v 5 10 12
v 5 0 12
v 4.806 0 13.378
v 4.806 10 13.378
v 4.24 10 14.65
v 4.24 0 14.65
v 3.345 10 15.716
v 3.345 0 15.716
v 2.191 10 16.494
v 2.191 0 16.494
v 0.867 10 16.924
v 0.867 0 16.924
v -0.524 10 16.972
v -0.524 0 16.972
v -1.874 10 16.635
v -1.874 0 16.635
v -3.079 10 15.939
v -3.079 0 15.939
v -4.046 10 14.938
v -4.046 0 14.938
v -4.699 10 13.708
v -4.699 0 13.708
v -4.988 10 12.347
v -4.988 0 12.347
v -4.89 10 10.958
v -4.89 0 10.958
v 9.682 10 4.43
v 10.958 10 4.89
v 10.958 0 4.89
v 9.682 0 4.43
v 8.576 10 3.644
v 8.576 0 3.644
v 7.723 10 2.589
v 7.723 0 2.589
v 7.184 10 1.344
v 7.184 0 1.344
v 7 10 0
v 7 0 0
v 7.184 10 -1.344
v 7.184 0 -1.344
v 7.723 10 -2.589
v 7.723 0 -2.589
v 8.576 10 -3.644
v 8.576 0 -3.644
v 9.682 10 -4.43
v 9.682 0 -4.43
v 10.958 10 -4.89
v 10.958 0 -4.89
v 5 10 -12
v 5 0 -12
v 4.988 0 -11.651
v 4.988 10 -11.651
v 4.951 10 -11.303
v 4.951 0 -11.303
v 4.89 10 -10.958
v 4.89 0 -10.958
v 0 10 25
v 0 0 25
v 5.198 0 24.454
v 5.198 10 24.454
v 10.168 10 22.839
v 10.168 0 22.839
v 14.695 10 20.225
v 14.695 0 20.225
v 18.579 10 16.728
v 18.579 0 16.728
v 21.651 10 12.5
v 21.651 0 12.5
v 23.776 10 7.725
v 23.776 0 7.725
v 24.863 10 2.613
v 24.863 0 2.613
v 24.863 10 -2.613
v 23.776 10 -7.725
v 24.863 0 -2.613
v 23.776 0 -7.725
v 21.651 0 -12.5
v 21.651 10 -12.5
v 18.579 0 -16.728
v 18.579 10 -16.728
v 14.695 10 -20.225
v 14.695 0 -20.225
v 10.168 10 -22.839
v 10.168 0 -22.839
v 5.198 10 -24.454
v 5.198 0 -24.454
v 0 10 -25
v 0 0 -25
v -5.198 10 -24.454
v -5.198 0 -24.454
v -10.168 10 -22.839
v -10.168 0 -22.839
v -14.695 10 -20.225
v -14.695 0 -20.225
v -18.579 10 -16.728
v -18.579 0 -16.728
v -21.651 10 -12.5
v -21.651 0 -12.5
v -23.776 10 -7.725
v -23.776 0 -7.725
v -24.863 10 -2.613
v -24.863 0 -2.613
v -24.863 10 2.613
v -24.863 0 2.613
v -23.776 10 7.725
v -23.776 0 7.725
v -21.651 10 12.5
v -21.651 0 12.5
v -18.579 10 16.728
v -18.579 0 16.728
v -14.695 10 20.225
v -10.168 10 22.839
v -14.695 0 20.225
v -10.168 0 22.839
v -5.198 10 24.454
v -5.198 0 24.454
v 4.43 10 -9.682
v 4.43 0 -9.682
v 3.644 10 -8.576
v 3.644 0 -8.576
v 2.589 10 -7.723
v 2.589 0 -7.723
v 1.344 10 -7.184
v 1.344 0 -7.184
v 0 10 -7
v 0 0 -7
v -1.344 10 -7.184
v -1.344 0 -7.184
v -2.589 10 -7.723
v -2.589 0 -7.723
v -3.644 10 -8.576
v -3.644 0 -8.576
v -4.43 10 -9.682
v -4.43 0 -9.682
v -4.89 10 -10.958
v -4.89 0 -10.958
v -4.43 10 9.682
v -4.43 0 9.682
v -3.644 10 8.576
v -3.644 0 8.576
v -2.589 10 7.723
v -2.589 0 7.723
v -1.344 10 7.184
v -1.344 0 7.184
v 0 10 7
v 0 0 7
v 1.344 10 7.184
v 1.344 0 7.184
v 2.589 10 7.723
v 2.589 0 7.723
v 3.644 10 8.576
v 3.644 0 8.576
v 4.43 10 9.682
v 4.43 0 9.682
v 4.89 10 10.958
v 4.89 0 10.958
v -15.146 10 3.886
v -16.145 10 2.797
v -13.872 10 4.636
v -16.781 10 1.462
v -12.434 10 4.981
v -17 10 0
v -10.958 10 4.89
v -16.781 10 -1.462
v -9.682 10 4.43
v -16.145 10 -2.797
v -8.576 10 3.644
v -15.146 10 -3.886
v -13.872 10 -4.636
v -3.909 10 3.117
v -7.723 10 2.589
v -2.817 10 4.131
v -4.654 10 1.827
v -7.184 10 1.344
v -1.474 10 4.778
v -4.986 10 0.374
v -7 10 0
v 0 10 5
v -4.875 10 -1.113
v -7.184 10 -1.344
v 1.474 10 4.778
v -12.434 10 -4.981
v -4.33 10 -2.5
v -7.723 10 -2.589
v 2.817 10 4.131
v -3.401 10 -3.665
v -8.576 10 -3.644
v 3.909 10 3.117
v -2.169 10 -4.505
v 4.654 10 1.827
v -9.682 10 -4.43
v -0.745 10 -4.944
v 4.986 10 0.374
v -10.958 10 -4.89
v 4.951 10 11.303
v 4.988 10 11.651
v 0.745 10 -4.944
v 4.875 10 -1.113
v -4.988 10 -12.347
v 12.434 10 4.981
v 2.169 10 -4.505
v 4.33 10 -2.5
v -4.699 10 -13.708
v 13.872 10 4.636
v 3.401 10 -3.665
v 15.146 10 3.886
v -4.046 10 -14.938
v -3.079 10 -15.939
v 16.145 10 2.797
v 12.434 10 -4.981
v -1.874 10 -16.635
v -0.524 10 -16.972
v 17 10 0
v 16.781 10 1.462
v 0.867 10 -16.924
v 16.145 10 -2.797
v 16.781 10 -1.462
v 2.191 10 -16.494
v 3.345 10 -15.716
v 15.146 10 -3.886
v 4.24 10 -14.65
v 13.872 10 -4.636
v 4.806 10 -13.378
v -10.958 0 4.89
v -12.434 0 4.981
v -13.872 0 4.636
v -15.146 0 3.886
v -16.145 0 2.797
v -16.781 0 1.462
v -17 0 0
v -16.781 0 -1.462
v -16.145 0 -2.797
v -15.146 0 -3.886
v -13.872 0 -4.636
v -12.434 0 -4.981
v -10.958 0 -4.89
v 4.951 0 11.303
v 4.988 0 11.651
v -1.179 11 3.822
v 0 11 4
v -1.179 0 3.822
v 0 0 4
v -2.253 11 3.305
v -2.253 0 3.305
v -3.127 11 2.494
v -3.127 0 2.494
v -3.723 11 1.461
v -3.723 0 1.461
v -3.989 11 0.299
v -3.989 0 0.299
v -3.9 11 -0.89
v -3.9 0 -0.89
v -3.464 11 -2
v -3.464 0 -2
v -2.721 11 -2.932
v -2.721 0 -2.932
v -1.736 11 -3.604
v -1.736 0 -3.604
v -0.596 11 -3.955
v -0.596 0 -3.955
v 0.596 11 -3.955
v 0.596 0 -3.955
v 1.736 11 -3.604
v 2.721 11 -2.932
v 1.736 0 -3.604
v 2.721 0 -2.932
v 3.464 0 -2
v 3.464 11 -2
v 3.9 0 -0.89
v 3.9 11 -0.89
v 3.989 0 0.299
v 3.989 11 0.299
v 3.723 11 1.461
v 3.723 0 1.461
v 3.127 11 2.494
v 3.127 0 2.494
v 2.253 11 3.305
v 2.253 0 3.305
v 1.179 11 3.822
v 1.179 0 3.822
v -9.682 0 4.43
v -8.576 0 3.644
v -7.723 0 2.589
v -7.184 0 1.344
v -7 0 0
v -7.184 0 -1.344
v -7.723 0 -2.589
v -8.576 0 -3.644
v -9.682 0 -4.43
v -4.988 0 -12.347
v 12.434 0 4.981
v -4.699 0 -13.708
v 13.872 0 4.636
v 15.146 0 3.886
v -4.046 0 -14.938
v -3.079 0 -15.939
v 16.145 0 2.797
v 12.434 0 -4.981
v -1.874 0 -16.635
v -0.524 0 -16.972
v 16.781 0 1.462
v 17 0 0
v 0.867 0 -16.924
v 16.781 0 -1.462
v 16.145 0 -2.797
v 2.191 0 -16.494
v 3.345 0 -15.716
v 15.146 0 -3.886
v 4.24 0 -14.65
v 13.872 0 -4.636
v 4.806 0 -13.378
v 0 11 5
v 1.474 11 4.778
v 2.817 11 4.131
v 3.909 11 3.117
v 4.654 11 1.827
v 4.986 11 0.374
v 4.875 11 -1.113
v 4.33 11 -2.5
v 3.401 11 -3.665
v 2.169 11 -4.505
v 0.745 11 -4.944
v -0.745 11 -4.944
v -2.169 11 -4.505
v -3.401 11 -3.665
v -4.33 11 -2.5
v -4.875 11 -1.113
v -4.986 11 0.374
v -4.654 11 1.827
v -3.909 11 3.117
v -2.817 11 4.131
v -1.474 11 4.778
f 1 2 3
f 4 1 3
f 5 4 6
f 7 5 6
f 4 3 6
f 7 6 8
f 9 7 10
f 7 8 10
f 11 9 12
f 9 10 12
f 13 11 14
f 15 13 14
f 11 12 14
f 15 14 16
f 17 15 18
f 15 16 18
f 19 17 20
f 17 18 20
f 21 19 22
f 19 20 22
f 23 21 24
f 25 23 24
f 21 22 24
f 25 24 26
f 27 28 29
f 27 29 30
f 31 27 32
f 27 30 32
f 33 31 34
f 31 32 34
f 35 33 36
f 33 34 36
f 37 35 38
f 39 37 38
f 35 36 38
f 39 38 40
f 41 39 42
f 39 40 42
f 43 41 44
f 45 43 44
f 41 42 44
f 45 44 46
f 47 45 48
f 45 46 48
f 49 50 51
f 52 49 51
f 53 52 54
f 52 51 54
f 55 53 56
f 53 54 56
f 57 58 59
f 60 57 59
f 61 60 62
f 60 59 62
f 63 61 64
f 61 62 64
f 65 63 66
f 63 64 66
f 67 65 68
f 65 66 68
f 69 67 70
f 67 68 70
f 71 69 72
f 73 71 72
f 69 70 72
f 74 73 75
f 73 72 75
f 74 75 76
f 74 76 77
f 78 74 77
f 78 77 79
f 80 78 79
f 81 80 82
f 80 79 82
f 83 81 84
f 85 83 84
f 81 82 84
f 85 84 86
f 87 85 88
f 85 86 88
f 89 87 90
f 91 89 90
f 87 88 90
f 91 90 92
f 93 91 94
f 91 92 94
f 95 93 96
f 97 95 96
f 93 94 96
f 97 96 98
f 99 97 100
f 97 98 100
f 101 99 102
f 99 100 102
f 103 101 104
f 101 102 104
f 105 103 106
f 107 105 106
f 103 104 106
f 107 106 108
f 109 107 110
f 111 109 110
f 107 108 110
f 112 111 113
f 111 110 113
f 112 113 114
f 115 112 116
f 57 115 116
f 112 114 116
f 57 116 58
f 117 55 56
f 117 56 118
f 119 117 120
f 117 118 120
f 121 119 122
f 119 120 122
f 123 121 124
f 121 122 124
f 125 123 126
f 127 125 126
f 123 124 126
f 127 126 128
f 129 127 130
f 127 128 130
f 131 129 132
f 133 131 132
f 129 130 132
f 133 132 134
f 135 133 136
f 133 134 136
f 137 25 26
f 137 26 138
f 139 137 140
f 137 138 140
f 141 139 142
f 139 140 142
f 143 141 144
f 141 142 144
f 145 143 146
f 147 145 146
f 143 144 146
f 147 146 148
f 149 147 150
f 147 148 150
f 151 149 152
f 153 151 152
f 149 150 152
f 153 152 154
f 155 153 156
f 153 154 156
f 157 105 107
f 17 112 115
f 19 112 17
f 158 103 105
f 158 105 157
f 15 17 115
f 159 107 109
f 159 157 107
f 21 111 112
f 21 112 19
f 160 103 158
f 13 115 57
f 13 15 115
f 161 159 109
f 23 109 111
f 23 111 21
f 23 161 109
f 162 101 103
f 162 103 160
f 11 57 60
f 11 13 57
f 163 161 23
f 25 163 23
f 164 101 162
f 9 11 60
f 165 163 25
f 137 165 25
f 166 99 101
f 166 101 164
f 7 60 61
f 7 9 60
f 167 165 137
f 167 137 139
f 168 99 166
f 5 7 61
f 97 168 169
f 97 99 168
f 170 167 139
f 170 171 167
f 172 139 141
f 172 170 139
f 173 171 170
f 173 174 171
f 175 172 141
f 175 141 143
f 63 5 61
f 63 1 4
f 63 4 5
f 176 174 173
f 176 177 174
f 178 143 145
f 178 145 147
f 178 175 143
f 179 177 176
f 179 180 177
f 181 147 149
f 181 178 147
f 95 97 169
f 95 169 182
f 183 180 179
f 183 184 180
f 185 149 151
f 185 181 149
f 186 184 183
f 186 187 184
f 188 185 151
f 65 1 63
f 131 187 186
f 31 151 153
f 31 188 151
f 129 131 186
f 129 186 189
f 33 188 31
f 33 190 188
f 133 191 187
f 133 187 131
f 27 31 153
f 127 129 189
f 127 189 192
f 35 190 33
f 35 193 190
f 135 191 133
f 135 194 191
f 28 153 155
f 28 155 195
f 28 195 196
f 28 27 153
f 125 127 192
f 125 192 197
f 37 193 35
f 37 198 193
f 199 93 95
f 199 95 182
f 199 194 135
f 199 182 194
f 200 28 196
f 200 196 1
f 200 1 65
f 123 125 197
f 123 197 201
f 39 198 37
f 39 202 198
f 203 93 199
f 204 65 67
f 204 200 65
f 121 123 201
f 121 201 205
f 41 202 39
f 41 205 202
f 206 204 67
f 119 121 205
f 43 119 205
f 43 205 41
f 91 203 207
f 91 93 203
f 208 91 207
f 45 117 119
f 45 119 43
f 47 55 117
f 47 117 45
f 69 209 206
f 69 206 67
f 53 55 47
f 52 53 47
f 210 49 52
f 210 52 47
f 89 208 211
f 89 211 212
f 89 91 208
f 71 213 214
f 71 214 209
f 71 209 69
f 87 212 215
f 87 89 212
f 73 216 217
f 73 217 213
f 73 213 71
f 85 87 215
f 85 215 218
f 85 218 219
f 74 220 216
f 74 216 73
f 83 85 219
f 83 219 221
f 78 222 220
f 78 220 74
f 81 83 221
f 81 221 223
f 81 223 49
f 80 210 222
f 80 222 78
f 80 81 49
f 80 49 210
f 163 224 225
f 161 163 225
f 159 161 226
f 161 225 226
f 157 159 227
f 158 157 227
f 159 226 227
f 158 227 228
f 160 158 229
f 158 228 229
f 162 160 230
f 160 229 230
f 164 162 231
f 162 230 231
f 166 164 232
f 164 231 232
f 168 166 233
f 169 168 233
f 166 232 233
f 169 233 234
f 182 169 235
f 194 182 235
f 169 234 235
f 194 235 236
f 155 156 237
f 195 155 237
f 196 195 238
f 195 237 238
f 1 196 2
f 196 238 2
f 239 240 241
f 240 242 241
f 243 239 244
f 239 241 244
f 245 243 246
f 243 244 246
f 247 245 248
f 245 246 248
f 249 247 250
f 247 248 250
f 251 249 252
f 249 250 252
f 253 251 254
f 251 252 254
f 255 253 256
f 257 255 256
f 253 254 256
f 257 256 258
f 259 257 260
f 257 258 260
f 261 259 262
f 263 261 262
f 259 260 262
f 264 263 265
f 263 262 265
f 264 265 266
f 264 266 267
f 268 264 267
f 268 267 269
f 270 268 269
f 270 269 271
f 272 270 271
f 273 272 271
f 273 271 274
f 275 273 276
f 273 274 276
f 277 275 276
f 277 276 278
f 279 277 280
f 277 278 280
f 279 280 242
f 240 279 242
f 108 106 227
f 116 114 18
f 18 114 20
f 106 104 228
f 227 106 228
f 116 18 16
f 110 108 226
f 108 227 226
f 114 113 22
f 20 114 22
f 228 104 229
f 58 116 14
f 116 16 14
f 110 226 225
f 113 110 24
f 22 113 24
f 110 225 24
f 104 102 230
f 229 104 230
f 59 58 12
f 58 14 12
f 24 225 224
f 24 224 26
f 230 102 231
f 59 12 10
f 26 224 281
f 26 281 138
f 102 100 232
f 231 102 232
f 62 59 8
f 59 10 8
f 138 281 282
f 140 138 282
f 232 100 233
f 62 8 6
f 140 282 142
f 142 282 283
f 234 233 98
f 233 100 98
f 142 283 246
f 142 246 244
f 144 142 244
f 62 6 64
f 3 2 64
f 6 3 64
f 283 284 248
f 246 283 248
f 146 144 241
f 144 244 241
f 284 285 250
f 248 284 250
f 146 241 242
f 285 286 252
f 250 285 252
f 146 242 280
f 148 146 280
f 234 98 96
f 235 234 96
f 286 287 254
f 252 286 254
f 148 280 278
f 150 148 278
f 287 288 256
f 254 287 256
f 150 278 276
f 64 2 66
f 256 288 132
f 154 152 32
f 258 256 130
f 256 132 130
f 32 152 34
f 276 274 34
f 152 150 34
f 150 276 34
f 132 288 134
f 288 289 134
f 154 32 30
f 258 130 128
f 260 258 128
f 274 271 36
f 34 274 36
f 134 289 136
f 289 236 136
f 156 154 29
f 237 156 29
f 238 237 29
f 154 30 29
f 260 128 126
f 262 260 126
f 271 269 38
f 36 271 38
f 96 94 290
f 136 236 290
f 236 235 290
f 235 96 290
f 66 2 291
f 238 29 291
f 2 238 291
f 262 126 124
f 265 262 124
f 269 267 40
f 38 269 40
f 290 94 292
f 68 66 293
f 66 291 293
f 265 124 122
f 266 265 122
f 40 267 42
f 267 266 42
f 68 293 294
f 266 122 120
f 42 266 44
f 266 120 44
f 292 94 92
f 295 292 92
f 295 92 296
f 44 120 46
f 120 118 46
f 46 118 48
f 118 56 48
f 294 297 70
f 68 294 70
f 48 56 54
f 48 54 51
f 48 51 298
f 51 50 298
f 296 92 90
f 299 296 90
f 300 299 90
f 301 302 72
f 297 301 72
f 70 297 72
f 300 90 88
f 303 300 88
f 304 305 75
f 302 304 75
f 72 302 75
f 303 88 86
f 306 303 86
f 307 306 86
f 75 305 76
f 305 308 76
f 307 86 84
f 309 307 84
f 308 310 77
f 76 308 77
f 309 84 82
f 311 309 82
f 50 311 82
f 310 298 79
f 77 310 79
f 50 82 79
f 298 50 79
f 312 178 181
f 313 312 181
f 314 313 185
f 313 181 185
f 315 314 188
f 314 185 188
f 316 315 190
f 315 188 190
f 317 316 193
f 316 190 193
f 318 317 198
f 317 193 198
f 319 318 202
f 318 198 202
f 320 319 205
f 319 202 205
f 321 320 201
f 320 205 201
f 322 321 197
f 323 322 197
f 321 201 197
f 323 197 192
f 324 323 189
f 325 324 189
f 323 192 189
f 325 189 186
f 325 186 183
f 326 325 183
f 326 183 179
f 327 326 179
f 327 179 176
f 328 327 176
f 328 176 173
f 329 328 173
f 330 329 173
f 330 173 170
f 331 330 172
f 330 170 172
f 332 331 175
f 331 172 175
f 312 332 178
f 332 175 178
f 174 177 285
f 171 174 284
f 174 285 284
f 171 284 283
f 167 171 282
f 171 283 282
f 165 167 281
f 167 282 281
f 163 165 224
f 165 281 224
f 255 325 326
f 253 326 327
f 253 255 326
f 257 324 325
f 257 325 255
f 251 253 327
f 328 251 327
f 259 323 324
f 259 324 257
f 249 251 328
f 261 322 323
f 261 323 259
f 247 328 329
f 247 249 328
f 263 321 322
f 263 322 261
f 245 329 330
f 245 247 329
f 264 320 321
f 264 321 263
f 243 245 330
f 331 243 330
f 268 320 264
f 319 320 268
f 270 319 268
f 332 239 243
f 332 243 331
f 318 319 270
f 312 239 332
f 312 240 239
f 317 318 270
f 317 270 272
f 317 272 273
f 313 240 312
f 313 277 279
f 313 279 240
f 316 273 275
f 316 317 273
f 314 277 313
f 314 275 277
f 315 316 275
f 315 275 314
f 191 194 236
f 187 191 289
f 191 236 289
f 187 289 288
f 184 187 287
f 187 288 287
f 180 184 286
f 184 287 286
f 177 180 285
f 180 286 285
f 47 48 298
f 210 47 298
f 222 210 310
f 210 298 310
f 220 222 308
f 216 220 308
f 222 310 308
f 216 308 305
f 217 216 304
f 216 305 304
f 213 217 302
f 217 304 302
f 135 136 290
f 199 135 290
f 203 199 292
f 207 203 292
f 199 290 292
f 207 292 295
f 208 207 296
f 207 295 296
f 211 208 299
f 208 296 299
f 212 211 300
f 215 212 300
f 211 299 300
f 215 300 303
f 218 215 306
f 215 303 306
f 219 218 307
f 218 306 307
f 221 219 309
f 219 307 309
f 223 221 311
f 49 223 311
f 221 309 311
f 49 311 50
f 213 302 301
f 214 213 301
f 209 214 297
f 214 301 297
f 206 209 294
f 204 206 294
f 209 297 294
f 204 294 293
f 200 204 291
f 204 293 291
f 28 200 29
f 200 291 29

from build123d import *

# Parameters (mm, degrees)
SKETCH1_R           = 25
SKETCH1_R_2         = 4
BOSS_EXTRUDE1_DEPTH = 10
SKETCH2_R           = 5
BOSS_EXTRUDE2_DEPTH = 1
SKETCH3_R           = 4
CUT_EXTRUDE1_DEPTH  = 83


with BuildPart() as part:
    # Sketch1 → Boss-Extrude1 (new body)
    # profile 1 of 2: a face of its own
    with BuildSketch(Plane(origin=(0, 0, 0), x_dir=(1, 0, 0), z_dir=(0, 1, 0))):
        with Locations(Location((0, 0, 0), (0, 0, 270))):
            Circle(SKETCH1_R)
        with BuildLine():
            ThreePointArc((-4.890289414, -10.958333333), (-8.485281374, -8.485281374), (-10.958333333, -4.890289414))
            ThreePointArc((-10.958333333, -4.890289414), (-17, 0), (-10.958333333, 4.890289414))
            ThreePointArc((-10.958333333, 4.890289414), (-8.485281374, 8.485281374), (-4.890289414, 10.958333333))
            ThreePointArc((-4.890289414, 10.958333333), (-0.523714105, 16.97249671), (5, 12))
            ThreePointArc((5, 12), (4.97249671, 11.476285895), (4.890289414, 10.958333333))
            ThreePointArc((4.890289414, 10.958333333), (8.485281374, 8.485281374), (10.958333333, 4.890289414))
            ThreePointArc((10.958333333, 4.890289414), (15.145764348, 3.886407939), (17, 0))
            ThreePointArc((17, 0), (15.145764348, -3.886407939), (10.958333333, -4.890289414))
            ThreePointArc((10.958333333, -4.890289414), (8.485281374, -8.485281374), (4.890289414, -10.958333333))
            ThreePointArc((4.890289414, -10.958333333), (4.97249671, -11.476285895), (5, -12))
            ThreePointArc((5, -12), (-0.523714105, -16.97249671), (-4.890289414, -10.958333333))
        make_face(mode=Mode.SUBTRACT)
    # profile 2 of 2: a face of its own
    with BuildSketch(Plane(origin=(0, 0, 0), x_dir=(1, 0, 0), z_dir=(0, 1, 0))):
        with BuildLine():
            ThreePointArc((-7, 0), (-8.113592061, -3.145764348), (-10.958333333, -4.890289414))
            ThreePointArc((-10.958333333, -4.890289414), (-8.485281374, -8.485281374), (-4.890289414, -10.958333333))
            ThreePointArc((-4.890289414, -10.958333333), (0, -7), (4.890289414, -10.958333333))
            ThreePointArc((4.890289414, -10.958333333), (8.485281374, -8.485281374), (10.958333333, -4.890289414))
            ThreePointArc((10.958333333, -4.890289414), (7, 0), (10.958333333, 4.890289414))
            ThreePointArc((10.958333333, 4.890289414), (8.485281374, 8.485281374), (4.890289414, 10.958333333))
            ThreePointArc((4.890289414, 10.958333333), (0, 7), (-4.890289414, 10.958333333))
            ThreePointArc((-4.890289414, 10.958333333), (-8.485281374, 8.485281374), (-10.958333333, 4.890289414))
            ThreePointArc((-10.958333333, 4.890289414), (-8.113592061, 3.145764348), (-7, 0))
        make_face()
        with Locations(Location((0, 0, 0), (0, 0, 270))):
            Circle(SKETCH1_R_2, mode=Mode.SUBTRACT)
    extrude(amount=BOSS_EXTRUDE1_DEPTH)

    # Sketch2 → Boss-Extrude2 (add)
    with BuildSketch(Plane(origin=(0, 10, 0), x_dir=(1, 0, 0), z_dir=(0, 1, 0))):
        with Locations(Location((0, 0, 0), (0, 0, 270))):
            Circle(SKETCH2_R)
    extrude(amount=BOSS_EXTRUDE2_DEPTH)

    # Sketch3 → Cut-Extrude1 (cut)
    with BuildSketch(Plane.XZ.offset(-10)):
        with Locations(Location((0, 0, 0), (0, 0, 90))):
            Circle(SKETCH3_R)
    extrude(amount=-CUT_EXTRUDE1_DEPTH, mode=Mode.SUBTRACT)


solid = part.part
